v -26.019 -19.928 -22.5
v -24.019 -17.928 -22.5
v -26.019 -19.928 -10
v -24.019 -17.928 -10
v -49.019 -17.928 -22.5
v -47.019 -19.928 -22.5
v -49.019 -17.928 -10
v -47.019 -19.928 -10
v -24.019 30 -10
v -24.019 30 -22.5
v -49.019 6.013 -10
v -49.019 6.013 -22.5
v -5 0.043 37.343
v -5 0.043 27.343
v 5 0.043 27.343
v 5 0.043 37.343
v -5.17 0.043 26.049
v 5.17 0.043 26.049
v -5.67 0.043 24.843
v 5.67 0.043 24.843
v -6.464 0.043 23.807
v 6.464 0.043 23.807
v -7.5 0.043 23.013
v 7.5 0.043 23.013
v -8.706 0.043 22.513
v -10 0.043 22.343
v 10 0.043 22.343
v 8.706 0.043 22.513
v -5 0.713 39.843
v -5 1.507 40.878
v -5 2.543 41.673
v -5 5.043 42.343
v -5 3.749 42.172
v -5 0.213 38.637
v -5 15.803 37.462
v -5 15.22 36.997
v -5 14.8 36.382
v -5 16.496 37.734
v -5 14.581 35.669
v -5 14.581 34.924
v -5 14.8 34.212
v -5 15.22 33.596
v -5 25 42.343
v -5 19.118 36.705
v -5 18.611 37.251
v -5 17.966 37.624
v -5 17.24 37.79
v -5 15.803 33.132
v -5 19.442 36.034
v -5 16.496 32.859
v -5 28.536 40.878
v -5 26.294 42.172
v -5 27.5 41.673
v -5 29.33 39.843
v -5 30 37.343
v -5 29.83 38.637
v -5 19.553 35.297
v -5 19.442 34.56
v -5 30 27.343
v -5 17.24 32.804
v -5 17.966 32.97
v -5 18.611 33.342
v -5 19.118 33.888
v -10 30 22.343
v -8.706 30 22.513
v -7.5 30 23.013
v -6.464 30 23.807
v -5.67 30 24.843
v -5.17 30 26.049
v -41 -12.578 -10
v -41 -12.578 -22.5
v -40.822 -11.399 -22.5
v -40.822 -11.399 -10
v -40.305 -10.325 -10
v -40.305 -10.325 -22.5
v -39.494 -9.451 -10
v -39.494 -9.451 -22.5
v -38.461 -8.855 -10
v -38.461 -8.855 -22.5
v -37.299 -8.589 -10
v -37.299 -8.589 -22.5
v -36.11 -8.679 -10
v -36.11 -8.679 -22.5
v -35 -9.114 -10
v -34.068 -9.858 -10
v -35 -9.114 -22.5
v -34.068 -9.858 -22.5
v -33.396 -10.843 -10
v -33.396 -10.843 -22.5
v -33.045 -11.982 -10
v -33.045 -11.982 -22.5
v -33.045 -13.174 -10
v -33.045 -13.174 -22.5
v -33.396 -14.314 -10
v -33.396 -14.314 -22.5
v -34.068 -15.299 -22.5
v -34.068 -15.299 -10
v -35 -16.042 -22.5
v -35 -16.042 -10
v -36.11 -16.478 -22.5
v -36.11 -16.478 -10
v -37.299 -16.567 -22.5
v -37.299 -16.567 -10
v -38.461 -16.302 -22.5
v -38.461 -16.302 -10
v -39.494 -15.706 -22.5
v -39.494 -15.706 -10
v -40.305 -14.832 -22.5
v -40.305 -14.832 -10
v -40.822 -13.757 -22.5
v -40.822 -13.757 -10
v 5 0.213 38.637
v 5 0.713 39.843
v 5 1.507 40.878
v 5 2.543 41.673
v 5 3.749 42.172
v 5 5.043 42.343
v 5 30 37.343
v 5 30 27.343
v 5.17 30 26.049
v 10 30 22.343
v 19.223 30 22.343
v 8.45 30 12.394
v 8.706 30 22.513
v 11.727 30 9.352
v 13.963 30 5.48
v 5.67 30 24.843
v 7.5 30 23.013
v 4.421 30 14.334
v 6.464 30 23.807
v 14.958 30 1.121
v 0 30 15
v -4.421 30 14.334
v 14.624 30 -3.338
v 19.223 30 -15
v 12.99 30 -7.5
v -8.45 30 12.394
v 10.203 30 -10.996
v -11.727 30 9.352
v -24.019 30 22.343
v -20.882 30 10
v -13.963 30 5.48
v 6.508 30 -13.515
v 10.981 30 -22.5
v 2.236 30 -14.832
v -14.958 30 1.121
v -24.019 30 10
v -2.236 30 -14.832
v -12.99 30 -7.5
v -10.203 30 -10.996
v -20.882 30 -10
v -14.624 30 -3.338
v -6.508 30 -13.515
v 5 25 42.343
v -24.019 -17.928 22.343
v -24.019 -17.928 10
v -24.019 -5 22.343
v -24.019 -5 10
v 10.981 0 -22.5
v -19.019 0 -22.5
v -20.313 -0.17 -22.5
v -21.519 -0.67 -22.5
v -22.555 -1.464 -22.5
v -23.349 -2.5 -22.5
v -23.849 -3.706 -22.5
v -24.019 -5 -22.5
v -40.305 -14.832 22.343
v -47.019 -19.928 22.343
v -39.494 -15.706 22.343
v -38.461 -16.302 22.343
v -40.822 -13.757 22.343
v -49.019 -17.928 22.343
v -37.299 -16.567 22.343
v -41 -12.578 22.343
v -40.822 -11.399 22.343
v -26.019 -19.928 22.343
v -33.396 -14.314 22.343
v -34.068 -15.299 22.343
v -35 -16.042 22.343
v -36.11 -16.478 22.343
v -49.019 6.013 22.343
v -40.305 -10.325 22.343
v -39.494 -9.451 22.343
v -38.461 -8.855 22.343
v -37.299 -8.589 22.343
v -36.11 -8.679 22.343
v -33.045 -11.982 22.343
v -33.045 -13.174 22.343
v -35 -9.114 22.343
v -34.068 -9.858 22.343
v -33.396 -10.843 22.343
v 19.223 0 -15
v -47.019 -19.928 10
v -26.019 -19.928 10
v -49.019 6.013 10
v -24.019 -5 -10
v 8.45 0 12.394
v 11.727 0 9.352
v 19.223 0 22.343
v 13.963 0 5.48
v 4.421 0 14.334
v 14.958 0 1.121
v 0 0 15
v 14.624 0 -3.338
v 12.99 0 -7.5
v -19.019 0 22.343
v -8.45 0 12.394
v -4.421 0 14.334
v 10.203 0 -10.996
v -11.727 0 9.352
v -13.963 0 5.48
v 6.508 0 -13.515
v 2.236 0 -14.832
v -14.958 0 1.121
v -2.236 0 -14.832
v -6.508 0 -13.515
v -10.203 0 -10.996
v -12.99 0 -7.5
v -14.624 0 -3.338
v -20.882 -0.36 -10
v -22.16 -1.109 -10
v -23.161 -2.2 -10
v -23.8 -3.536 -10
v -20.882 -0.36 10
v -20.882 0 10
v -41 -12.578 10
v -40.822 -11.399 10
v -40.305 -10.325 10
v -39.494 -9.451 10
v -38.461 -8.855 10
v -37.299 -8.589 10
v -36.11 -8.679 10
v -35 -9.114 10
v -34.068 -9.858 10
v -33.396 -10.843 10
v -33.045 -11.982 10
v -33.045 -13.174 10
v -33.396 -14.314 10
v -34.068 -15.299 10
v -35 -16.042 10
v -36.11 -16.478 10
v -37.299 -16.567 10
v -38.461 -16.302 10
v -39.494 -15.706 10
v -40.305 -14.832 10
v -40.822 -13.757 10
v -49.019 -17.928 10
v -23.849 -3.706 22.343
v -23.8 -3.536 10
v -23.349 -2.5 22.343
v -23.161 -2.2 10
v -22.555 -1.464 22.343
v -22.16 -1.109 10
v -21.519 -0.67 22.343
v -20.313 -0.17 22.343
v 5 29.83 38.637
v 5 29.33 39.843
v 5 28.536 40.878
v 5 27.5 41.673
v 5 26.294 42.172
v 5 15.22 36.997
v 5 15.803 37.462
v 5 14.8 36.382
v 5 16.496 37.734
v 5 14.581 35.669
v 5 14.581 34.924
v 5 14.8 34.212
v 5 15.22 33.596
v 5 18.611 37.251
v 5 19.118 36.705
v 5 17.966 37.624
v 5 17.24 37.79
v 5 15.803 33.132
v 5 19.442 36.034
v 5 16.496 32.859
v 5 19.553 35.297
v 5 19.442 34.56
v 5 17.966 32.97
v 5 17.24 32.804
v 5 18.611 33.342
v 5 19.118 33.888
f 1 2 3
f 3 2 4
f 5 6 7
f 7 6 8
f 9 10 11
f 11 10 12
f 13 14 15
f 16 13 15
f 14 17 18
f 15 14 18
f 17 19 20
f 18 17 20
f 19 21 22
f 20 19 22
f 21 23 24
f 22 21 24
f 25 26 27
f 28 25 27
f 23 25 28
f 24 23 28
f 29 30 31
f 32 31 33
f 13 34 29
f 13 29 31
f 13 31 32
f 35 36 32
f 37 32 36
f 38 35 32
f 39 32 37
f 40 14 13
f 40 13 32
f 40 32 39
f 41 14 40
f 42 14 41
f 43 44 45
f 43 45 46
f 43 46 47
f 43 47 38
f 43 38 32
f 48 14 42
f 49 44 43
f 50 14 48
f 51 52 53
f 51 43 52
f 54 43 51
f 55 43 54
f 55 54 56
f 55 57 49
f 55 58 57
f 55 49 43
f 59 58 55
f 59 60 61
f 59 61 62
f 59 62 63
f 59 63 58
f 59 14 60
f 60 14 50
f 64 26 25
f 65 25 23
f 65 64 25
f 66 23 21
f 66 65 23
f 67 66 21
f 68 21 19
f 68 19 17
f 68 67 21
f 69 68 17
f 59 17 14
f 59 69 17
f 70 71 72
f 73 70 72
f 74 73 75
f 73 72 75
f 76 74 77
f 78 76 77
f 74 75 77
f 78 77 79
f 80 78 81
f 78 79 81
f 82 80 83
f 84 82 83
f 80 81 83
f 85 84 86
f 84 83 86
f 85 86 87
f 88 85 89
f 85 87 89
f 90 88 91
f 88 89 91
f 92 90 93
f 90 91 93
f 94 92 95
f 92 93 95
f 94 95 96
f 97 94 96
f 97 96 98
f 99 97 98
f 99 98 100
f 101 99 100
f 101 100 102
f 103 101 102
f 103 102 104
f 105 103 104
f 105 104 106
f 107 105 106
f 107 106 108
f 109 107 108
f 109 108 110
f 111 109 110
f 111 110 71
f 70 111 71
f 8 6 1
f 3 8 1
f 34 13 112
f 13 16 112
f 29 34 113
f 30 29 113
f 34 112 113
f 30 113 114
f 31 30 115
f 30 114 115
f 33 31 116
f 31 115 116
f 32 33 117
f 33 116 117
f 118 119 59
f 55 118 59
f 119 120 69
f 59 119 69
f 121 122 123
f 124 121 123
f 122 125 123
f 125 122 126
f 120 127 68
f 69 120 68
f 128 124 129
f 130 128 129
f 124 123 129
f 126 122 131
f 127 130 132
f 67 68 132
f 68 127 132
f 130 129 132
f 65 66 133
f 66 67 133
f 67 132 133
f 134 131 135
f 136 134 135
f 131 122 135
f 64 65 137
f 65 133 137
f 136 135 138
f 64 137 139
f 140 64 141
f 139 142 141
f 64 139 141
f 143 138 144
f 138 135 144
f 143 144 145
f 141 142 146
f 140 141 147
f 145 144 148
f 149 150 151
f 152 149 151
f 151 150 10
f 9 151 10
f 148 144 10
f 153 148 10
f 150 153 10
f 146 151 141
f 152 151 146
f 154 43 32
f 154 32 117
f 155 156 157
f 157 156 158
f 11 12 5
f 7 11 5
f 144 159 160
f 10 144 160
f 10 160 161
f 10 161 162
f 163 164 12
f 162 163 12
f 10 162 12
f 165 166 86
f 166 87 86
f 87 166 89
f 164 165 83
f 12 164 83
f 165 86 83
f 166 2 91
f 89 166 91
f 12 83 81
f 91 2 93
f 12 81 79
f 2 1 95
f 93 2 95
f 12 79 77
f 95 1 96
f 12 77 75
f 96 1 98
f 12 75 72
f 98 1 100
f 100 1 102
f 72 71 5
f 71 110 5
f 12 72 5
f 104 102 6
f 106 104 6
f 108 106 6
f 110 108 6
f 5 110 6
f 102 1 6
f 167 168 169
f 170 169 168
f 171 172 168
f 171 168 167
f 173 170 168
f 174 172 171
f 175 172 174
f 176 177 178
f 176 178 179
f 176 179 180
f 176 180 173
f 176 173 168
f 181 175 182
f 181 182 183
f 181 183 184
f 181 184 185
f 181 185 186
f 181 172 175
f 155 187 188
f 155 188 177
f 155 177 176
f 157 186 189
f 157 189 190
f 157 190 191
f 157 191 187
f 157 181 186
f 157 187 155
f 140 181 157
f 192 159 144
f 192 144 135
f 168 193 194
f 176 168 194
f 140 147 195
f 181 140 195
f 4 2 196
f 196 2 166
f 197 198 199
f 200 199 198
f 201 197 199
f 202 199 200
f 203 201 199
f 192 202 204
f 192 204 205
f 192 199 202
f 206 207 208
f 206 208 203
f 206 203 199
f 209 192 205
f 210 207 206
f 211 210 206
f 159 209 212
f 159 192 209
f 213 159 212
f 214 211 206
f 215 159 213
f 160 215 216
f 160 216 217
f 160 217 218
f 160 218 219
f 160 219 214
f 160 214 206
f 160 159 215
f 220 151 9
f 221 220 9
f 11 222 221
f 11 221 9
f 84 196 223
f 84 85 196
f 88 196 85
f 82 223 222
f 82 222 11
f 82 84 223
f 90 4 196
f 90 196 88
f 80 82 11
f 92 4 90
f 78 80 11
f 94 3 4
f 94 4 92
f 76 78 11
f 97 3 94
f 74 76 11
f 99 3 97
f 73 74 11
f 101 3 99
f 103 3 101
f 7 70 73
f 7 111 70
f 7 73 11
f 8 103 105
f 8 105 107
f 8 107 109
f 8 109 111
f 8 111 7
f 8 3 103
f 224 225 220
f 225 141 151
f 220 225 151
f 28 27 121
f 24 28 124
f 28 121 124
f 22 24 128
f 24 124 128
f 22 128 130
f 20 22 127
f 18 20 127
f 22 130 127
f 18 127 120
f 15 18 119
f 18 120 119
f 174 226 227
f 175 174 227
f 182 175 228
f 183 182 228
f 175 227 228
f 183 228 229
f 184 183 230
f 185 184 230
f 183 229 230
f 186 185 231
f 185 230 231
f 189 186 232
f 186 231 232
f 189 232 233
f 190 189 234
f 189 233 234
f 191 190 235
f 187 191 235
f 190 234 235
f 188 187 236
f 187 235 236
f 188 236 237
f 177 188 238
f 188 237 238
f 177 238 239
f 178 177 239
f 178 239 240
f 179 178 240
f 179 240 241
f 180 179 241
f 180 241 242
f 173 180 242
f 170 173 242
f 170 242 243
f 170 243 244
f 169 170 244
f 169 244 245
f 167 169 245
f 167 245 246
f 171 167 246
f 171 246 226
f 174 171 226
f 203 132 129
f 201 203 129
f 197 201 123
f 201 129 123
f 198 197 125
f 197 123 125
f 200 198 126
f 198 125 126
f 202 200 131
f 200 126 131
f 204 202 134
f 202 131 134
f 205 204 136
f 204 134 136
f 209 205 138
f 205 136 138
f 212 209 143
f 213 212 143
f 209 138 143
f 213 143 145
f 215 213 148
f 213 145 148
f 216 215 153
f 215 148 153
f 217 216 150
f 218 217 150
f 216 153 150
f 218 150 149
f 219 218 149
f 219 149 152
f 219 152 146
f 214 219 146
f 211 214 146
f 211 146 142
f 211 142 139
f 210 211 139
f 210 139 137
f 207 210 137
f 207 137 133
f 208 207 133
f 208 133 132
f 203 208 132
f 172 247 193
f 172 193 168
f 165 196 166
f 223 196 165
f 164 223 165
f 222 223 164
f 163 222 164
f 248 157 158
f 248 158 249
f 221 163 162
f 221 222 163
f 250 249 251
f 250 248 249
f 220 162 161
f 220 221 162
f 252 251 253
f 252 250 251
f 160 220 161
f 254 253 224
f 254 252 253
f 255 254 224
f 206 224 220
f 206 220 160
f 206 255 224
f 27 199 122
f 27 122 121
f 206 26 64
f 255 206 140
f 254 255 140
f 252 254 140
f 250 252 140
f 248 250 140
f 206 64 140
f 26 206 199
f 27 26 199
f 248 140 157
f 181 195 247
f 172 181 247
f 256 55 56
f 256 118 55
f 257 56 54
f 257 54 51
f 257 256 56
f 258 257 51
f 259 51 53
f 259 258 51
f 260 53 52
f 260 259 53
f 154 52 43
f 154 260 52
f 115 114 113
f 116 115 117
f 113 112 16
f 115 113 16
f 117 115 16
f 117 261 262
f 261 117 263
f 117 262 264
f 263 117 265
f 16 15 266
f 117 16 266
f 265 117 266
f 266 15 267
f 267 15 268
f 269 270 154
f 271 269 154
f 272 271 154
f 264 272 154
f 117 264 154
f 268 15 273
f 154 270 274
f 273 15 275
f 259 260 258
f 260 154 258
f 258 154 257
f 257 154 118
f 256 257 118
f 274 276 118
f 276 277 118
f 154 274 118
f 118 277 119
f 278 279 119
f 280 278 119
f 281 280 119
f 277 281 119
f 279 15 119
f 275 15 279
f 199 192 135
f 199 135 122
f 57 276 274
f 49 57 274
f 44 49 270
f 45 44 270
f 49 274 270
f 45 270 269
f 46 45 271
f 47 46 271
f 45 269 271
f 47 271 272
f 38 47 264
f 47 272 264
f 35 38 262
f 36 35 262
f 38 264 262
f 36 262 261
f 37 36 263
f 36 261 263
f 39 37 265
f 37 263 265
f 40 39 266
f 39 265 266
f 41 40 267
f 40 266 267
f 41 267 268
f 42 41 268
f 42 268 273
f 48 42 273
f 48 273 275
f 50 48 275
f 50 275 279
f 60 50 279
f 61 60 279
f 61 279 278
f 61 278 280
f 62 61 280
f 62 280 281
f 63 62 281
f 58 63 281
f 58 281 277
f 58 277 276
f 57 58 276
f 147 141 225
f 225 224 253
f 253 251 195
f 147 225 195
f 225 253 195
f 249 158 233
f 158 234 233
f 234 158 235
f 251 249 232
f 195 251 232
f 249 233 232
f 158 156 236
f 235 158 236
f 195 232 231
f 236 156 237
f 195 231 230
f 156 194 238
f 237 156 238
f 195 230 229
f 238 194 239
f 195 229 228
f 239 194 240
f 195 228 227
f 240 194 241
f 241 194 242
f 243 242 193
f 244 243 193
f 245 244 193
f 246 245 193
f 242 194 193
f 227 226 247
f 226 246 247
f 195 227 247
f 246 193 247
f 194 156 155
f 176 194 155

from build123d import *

# Parameters (mm, degrees)
EXTRUDE_1_DEPTH       = 30
SKETCH_2_R            = 15
CUT_EXTRUDE_2_DEPTH   = 45.532745299
EXTRUDE_3_DEPTH       = 44.84276
CUT_EXTRUDE_START     = 70
SKETCH_3_W            = 44.656689001
SKETCH_3_H            = 20
CUT_EXTRUDE_1_DEPTH   = 130
SKETCH_7_R            = 3.999999997
CUT_EXTRUDE_2_2_DEPTH = 73.895417278
FILLET_1_R            = 5
CHAMFER_5_SIZE        = 2
SKETCH_8_W            = 10
SKETCH_8_H            = 29.95730412
EXTRUDE_4_DEPTH       = 20
FILLET_2_R            = 5
SKETCH_10_R           = 2.5
CUT_EXTRUDE_3_DEPTH   = 75.906399488


with BuildPart() as part:
    # Эскиз1 → Вытянуть1 (new body)
    with BuildSketch(Plane(origin=(0, 0, 0), x_dir=(1, 0, 0), z_dir=(0, 1, 0))):
        Polygon((-24.019063342, 22.5), (10.980936658, 22.5), (19.22346273, 15), (19.22346273, -22.342761837), (-24.019063342, -22.342761837), align=None)
    extrude(amount=EXTRUDE_1_DEPTH)

    # Эскиз2 → Cut-Extrude 2 (cut, through all)
    with BuildSketch(Plane(origin=(0, 30, 0), x_dir=(1, 0, 0), z_dir=(0, 1, 0))):
        with Locations(Location((0, 0, 0), (0, 0, 270))):
            Circle(SKETCH_2_R)
    extrude(amount=-CUT_EXTRUDE_2_DEPTH, mode=Mode.SUBTRACT)

    # Эскиз6 → Вытянуть3 (add)
    with BuildSketch(Plane(origin=(0, 0, -22.5), x_dir=(-1, 0, 0), z_dir=(0, 0, -1))):
        Polygon((24.019063342, -19.927530698), (24.019063342, 30), (49.019063342, 6.012561534), (49.019063342, -19.927530698), align=None)
    extrude(amount=-EXTRUDE_3_DEPTH)

    # Эскиз3 → Вырез-Вытянуть1 (cut)
    with BuildSketch(Plane(origin=(0, 30, 0), x_dir=(1, 0, 0), z_dir=(0, 1, 0)).offset(CUT_EXTRUDE_START)):
        with Locations((-43.210774099, 0)):
            Rectangle(SKETCH_3_W, SKETCH_3_H)
    extrude(amount=-CUT_EXTRUDE_1_DEPTH, mode=Mode.SUBTRACT)

    # Эскиз7 → Cut-Extrude 2 2 (cut, through all)
    with BuildSketch(Plane(origin=(0, 0, -22.5), x_dir=(-1, 0, 0), z_dir=(0, 0, -1))):
        with Locations((37.000000002, -12.578306382)):
            Circle(SKETCH_7_R)
    extrude(amount=-CUT_EXTRUDE_2_2_DEPTH, mode=Mode.SUBTRACT)

    # Скругление1
    # the kernel refuses this fillet: 5 mm, written as the material it adds along each edge
    with BuildSketch(Plane(origin=(-24.019063342, 0, 34.84276), x_dir=(1, 0, 0), z_dir=(0, 0, -1))) as fillet_1_piece_1_section:
        with BuildLine():
            CenterArc((FILLET_1_R, FILLET_1_R), FILLET_1_R, 180, 90)
            Line((0, FILLET_1_R), (0, 0))
            Line((0, 0), (FILLET_1_R, 0))
        make_face()
    fillet_1_piece_1 = extrude(amount=24.84276, mode=Mode.PRIVATE)
    fillet_1_piece_1 = split(fillet_1_piece_1, bisect_by=Plane(origin=(-20.42000997, -0.107354451, 22.342761837), z_dir=(0, 0, -1)), keep=Keep.TOP, mode=Mode.PRIVATE)
    add(fillet_1_piece_1)
    with BuildSketch(Plane(origin=(-24.019063342, 0, 22.34276), x_dir=(1, 0, 0), z_dir=(0, 0, -1))) as fillet_1_piece_2_section:
        with BuildLine():
            CenterArc((FILLET_1_R, FILLET_1_R), FILLET_1_R, 180, 90)
            Line((0, FILLET_1_R), (0, 0))
            Line((0, 0), (FILLET_1_R, 0))
        make_face()
    fillet_1_piece_2 = extrude(amount=24.84276, mode=Mode.PRIVATE)
    fillet_1_piece_2 = split(fillet_1_piece_2, bisect_by=Plane(origin=(-20.882429598, -0.107354451, 3.75), z_dir=(1, 0, 0)), keep=Keep.TOP, mode=Mode.PRIVATE)
    add(fillet_1_piece_2)
    with BuildSketch(Plane(origin=(-24.019063342, 0, 2.5), x_dir=(1, 0, 0), z_dir=(0, 0, -1))) as fillet_1_piece_3_section:
        with BuildLine():
            CenterArc((FILLET_1_R, FILLET_1_R), FILLET_1_R, 180, 90)
            Line((0, FILLET_1_R), (0, 0))
            Line((0, 0), (FILLET_1_R, 0))
        make_face()
    fillet_1_piece_3 = extrude(amount=25, mode=Mode.PRIVATE)
    fillet_1_piece_3 = split(fillet_1_piece_3, bisect_by=Plane(origin=(-20.882429598, -0.107354451, -3.75), z_dir=(1, 0, 0)), keep=Keep.TOP, mode=Mode.PRIVATE)
    add(fillet_1_piece_3)
    with BuildSketch(Plane(origin=(-24.019063342, 0, -10), x_dir=(1, 0, 0), z_dir=(0, 0, -1))) as fillet_1_piece_4:
        with BuildLine():
            CenterArc((FILLET_1_R, FILLET_1_R), FILLET_1_R, 180, 90)
            Line((0, FILLET_1_R), (0, 0))
            Line((0, 0), (FILLET_1_R, 0))
        make_face()
    extrude(amount=12.5)
    # the kernel refuses this fillet: 5 mm, written as the material it takes off along each edge

    # Фаска5
    chamfer_5_edges = [part.edges().sort_by_distance(p)[0] for p in [
        (-49.019063342, -19.927530698, 16.17138),
        (-24.019063342, -19.927530698, 16.17138),
        (-24.019063342, -19.927530698, -16.25),
        (-49.019063342, -19.927530698, -16.25),
    ]]
    chamfer(chamfer_5_edges, length=CHAMFER_5_SIZE)

    # Эскиз8 → Вытянуть4 (add)
    with BuildSketch(Plane.XY.offset(22.342761837)):
        with Locations((0, 15.02134794)):
            Rectangle(SKETCH_8_W, SKETCH_8_H)
    extrude(amount=EXTRUDE_4_DEPTH)

    # Скругление2
    fillet_2_edges = [part.edges().sort_by_distance(p)[0] for p in [
        (0, 30, 42.342761837),
        (0, 0.04269588, 42.342761837),
        (-5, 15.02134794, 22.342761837),
        (5, 15.02134794, 22.342761837),
    ]]
    fillet(fillet_2_edges, radius=FILLET_2_R)

    # Эскиз10 → Вырез-Вытянуть3 (cut, through all)
    with BuildSketch(Plane(origin=(5, 0, 0), x_dir=(0, 0, -1), z_dir=(1, 0, 0))):
        with Locations(Location((-35.296798075, 17.052712081, 0), (0, 0, 90))):
            Circle(SKETCH_10_R)
    extrude(amount=-CUT_EXTRUDE_3_DEPTH, mode=Mode.SUBTRACT)


solid = part.part
